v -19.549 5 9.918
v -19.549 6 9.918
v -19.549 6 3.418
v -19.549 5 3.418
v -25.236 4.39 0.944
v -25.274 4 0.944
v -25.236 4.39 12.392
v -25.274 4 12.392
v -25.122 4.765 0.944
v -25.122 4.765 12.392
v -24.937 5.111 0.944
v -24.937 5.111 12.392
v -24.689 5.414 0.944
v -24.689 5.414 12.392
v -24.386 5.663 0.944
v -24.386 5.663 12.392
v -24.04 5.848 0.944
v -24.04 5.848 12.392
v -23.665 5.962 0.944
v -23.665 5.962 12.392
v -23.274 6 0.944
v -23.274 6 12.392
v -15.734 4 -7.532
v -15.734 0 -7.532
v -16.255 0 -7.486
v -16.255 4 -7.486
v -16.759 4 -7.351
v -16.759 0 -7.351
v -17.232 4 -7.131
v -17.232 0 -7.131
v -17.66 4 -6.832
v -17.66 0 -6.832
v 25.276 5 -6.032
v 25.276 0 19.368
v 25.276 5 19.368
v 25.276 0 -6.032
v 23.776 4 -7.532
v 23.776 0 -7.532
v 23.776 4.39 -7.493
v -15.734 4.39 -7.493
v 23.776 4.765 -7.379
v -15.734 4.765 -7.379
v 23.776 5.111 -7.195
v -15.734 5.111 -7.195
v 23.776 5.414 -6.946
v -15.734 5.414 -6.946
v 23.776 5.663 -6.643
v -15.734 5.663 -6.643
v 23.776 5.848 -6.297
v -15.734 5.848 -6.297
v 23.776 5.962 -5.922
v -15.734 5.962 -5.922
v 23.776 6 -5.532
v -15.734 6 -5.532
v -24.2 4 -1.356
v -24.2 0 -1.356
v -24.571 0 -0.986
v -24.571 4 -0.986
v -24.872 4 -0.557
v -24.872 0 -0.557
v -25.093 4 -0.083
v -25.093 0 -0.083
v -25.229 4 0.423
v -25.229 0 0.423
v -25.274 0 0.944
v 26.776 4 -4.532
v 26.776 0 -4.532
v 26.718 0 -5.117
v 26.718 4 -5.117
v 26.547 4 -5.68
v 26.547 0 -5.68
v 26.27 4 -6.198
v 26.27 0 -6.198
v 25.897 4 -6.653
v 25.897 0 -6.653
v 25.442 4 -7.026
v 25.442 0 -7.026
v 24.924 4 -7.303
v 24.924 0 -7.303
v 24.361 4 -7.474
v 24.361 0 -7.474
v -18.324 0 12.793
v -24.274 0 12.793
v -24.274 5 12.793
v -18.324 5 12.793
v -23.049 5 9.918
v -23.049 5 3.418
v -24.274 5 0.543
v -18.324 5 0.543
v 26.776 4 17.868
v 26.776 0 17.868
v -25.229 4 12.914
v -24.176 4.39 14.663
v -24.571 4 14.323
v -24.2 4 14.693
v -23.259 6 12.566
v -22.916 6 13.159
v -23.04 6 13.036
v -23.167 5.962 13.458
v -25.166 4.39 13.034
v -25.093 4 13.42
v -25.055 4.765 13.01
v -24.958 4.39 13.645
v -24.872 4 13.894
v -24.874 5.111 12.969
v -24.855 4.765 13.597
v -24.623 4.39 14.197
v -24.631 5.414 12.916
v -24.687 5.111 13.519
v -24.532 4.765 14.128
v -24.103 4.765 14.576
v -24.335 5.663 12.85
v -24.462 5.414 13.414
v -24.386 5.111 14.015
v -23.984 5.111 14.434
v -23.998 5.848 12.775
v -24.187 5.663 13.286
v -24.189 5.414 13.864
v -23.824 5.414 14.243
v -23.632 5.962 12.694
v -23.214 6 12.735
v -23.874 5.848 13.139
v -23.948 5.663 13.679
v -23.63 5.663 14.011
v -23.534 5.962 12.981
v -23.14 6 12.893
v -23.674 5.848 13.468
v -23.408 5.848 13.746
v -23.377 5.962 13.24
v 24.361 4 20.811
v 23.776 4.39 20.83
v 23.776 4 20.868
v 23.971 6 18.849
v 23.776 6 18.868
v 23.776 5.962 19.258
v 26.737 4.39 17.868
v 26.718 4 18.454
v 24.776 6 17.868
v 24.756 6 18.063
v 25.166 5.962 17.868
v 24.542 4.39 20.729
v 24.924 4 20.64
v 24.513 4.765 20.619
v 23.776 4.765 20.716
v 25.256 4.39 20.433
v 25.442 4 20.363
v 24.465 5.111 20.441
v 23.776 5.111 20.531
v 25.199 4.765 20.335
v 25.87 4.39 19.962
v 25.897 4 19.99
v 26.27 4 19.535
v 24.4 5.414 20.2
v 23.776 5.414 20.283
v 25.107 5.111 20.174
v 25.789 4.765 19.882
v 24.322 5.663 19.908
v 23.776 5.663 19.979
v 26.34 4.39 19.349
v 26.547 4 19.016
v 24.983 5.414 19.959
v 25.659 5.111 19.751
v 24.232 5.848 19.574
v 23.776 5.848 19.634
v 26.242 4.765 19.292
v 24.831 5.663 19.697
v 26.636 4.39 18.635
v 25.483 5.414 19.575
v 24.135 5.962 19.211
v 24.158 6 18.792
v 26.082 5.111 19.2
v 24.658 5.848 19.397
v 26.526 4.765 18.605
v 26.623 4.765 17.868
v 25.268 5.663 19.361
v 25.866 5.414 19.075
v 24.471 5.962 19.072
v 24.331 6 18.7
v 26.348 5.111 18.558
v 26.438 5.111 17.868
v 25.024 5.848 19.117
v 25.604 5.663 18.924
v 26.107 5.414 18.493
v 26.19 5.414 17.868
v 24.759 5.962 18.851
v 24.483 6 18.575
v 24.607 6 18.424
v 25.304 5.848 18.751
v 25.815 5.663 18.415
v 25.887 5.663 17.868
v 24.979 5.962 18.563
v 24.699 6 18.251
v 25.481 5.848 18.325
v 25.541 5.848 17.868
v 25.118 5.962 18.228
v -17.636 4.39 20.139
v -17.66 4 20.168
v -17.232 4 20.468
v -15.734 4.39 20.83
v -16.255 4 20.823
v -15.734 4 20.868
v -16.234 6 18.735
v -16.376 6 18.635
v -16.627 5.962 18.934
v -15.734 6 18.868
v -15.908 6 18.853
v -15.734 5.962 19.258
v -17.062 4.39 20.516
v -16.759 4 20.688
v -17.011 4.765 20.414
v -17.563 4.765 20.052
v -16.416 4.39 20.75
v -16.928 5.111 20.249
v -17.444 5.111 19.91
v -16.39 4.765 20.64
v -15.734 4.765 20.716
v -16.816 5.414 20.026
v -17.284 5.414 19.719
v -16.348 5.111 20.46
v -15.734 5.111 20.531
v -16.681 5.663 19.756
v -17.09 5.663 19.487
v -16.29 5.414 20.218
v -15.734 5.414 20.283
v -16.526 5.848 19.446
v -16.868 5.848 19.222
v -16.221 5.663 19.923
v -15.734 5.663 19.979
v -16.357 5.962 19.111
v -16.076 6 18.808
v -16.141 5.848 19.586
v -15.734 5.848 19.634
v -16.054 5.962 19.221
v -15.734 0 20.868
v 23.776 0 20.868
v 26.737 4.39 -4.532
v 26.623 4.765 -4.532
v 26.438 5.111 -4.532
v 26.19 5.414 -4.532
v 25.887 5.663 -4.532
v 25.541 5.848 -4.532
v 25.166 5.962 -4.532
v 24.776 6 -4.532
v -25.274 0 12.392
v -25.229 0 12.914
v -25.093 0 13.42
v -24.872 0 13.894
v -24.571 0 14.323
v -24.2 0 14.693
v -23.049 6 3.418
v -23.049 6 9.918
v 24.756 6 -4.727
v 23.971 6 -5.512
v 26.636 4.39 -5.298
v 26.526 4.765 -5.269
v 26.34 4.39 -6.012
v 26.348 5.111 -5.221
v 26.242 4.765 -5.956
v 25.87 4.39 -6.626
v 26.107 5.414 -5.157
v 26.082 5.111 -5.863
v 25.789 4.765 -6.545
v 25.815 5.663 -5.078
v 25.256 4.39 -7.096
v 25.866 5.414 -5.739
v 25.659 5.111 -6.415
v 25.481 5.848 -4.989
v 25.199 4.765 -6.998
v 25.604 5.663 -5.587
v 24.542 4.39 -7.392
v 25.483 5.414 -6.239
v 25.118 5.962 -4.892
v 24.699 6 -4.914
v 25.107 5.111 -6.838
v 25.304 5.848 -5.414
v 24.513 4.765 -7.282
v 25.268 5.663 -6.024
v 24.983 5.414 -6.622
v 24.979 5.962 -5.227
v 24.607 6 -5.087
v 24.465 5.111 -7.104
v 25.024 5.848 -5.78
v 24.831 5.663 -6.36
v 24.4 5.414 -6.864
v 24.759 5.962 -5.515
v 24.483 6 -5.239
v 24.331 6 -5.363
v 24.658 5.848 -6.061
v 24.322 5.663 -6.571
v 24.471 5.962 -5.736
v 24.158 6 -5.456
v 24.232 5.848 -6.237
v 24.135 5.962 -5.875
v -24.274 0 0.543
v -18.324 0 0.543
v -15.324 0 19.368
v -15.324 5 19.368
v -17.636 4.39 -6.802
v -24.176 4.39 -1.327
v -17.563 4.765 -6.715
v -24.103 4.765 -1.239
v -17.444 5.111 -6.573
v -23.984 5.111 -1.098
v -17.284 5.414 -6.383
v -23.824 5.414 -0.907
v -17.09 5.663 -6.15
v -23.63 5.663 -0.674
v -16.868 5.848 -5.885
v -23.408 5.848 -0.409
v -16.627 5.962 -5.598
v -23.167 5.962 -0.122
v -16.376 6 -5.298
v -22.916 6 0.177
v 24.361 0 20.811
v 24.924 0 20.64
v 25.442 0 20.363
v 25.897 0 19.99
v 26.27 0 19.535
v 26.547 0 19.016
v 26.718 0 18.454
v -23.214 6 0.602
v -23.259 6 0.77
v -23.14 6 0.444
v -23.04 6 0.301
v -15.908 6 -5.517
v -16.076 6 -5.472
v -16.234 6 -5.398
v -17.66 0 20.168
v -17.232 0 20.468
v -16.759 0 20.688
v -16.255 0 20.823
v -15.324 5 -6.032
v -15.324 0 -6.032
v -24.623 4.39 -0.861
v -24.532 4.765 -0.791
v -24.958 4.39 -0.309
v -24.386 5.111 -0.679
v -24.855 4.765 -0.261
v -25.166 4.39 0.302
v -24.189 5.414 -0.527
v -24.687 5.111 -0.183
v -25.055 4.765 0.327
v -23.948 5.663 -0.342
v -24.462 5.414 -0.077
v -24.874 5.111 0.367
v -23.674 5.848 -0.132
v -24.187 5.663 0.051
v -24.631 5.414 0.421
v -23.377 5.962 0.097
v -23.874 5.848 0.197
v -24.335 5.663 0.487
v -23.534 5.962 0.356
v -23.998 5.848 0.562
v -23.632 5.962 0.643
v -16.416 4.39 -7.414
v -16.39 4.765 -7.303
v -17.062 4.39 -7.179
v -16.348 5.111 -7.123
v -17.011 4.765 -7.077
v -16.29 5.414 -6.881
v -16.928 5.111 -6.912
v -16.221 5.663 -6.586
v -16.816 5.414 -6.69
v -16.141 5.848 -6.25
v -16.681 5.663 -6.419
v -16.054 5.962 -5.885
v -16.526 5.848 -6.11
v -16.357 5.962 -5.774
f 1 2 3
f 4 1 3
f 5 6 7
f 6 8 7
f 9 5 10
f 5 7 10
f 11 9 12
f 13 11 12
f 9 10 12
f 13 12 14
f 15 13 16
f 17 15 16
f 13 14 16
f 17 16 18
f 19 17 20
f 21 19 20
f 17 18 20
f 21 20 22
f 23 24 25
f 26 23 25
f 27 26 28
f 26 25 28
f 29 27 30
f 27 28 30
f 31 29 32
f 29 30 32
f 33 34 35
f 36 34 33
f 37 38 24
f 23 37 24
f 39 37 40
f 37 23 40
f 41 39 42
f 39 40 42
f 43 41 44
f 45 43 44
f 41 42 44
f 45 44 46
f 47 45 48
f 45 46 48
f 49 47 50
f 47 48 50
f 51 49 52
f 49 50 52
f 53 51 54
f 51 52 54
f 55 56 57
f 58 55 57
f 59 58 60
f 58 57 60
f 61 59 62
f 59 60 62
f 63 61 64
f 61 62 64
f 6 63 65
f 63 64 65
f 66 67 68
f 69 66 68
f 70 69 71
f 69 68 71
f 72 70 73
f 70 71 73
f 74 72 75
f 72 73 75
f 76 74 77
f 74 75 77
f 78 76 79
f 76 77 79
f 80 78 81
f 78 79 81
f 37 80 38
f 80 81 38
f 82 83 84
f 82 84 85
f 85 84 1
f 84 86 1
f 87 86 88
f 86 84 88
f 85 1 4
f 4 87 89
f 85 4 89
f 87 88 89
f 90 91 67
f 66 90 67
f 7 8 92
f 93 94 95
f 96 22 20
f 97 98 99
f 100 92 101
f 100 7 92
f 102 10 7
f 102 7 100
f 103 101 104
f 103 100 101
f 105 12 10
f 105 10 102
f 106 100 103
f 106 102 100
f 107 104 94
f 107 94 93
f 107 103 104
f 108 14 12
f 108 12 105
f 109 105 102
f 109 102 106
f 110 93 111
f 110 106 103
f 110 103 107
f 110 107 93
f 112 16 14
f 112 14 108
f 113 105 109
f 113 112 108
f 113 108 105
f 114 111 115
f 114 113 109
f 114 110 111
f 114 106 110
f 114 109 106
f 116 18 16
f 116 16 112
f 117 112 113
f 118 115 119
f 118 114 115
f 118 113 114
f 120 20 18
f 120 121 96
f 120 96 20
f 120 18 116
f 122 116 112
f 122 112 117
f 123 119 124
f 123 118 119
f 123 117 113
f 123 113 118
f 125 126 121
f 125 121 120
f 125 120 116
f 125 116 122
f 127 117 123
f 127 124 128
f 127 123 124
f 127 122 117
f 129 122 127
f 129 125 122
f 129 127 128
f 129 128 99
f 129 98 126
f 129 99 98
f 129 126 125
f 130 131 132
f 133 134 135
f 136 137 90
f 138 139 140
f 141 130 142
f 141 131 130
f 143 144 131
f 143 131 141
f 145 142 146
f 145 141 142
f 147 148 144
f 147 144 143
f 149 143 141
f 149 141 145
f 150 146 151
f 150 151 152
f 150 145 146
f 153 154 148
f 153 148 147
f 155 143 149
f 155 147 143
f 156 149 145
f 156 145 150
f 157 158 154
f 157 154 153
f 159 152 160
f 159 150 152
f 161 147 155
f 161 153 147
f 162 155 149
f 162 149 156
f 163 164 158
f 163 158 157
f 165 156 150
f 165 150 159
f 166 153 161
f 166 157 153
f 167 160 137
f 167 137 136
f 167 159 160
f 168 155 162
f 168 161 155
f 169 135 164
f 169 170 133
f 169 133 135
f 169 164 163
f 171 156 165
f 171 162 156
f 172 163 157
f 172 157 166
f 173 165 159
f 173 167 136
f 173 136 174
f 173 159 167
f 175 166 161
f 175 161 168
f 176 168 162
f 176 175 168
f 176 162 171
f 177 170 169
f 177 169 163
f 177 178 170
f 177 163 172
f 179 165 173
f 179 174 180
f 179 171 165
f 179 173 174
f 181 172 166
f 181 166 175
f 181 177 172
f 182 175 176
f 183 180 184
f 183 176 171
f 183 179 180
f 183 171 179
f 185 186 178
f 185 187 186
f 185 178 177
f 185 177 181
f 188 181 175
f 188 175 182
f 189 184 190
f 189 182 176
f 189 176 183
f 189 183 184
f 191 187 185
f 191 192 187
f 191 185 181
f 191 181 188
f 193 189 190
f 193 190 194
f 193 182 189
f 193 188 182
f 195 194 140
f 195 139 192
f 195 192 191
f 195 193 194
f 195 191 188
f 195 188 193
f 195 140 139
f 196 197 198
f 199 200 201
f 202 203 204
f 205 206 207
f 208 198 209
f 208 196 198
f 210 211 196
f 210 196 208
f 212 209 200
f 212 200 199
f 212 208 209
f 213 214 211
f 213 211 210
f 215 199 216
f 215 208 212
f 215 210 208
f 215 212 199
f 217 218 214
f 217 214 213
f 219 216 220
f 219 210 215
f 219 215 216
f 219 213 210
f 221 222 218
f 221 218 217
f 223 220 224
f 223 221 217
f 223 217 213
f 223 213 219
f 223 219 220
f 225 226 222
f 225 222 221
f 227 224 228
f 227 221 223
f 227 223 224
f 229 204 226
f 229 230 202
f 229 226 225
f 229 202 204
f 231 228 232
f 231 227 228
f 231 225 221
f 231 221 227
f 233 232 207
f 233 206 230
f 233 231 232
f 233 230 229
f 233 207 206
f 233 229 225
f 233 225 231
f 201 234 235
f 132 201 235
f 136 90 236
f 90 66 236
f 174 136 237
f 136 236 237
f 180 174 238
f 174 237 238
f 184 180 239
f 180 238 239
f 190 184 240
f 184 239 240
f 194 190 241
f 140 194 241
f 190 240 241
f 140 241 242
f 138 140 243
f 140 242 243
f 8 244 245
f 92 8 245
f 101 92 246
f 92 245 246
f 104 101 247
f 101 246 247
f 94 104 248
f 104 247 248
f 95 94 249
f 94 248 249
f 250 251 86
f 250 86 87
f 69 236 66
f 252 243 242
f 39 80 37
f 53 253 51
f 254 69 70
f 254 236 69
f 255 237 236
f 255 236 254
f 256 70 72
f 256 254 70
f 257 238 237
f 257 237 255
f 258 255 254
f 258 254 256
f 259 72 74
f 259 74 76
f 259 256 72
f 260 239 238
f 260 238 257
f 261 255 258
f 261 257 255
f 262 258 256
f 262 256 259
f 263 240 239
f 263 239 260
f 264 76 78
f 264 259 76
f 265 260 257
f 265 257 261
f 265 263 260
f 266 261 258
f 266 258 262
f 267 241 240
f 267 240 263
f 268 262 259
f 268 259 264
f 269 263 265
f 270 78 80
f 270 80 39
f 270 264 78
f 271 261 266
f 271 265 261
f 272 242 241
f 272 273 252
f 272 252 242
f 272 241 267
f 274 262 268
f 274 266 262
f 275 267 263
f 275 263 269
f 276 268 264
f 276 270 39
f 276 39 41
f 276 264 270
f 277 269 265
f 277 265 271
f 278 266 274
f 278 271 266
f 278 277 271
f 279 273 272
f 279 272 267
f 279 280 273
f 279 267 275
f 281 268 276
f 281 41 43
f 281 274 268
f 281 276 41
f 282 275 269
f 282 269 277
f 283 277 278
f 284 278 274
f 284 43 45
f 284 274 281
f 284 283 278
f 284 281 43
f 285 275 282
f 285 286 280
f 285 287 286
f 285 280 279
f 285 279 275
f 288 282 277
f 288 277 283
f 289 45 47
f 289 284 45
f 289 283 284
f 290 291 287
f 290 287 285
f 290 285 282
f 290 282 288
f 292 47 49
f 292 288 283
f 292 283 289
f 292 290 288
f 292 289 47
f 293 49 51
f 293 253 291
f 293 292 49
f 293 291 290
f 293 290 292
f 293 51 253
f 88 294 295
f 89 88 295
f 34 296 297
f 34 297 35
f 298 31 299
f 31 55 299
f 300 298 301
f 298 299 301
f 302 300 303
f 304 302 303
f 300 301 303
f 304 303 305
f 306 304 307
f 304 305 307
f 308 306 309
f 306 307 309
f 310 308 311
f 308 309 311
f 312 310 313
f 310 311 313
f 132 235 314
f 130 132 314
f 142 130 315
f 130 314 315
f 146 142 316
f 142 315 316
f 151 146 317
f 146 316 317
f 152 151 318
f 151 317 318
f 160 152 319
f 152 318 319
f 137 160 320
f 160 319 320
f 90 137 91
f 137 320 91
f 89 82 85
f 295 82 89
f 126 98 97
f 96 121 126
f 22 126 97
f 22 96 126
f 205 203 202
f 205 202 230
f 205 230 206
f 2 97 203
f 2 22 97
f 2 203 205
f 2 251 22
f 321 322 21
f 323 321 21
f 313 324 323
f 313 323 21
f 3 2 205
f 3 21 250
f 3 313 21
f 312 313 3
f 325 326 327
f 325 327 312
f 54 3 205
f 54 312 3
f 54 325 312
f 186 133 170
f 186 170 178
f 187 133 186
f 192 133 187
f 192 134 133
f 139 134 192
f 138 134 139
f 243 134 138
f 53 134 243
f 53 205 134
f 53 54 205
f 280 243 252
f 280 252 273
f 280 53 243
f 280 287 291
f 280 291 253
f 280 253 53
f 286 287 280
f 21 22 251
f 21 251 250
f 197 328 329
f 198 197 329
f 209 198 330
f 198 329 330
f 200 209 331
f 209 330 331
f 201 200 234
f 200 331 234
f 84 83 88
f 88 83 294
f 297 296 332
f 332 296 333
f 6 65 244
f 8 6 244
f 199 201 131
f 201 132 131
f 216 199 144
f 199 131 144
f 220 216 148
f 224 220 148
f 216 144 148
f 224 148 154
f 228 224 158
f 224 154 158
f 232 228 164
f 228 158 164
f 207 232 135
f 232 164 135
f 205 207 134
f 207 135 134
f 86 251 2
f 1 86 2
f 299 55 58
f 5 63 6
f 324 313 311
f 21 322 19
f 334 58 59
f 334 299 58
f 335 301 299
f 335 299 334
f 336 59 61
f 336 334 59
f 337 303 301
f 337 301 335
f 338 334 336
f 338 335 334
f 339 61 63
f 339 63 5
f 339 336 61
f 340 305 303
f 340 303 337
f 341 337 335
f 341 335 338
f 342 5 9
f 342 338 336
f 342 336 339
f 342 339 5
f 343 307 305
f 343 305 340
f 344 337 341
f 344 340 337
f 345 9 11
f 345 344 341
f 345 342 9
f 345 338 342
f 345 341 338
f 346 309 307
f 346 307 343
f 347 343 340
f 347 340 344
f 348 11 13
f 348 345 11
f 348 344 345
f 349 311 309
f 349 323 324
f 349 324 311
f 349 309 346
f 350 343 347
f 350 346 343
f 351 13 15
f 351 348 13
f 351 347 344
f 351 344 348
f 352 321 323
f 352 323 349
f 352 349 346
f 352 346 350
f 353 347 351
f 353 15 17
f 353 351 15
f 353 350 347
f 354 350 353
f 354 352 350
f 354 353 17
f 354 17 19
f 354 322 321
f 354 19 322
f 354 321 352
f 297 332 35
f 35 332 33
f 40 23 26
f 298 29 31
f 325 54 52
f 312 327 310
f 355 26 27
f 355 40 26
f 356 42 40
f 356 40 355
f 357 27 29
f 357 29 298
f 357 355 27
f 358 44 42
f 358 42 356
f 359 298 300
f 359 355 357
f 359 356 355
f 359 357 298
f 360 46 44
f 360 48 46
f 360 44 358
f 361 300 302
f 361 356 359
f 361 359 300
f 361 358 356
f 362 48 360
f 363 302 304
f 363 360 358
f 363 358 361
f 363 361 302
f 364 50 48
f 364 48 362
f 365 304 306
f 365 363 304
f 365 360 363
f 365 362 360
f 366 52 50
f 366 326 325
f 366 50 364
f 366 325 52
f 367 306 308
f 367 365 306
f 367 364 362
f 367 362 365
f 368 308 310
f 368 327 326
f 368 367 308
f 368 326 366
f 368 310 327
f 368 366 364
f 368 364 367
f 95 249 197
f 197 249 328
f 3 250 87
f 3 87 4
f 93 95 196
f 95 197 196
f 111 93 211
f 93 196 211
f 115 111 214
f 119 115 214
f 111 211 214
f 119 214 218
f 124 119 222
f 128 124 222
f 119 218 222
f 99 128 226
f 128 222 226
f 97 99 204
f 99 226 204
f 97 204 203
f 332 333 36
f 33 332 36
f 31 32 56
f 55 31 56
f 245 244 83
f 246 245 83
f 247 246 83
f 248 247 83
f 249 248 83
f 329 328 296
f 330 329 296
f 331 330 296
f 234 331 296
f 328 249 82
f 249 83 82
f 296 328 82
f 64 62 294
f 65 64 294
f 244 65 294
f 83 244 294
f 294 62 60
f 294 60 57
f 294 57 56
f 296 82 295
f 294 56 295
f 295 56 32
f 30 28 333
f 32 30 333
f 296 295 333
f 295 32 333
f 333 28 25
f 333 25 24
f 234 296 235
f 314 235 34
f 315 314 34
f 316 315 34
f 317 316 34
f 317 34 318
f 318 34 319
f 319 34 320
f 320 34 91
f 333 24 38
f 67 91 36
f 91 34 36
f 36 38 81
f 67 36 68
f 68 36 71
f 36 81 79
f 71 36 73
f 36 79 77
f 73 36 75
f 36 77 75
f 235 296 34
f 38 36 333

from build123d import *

# Parameters (mm, degrees)
BOSS_EXTRUDE1_DEPTH = 6
SKETCH2_W           = 40.6
SKETCH2_H           = 25.4
SKETCH2_W_2         = 5.95
SKETCH2_H_2         = 12.25
CUT_EXTRUDE1_DEPTH  = 5
SKETCH4_W           = 3.5
SKETCH4_H           = 6.5
CUT_EXTRUDE2_DEPTH  = 35.473394043
FILLET1_R           = 2


with BuildPart() as part:
    # Sketch1 → Boss-Extrude1 (new body)
    with BuildSketch(Plane(origin=(0, 0, 0), x_dir=(1, 0, 0), z_dir=(0, 1, 0))):
        with BuildLine():
            Line((26.775527572, -17.868301802), (26.775527572, 4.531698198))
            ThreePointArc((26.775527572, 4.531698198), (25.896847915, 6.653018542), (23.775527572, 7.531698198))
            Line((23.775527572, 7.531698198), (-15.734378779, 7.531698198))
            ThreePointArc((-15.734378779, 7.531698198), (-16.758931033, 7.351324535), (-17.660281792, 6.831893316))
            Line((-17.660281792, 6.831893316), (-24.200375442, 1.356016089))
            ThreePointArc((-24.200375442, 1.356016089), (-24.992717178, 0.325130027), (-25.274472428, -0.944179029))
            Line((-25.274472428, -0.944179029), (-25.274472428, -12.392424575))
            ThreePointArc((-25.274472428, -12.392424575), (-24.992717178, -13.661733631), (-24.200375442, -14.692619693))
            Line((-24.200375442, -14.692619693), (-17.660281792, -20.16849692))
            ThreePointArc((-17.660281792, -20.16849692), (-16.758931033, -20.687928139), (-15.734378779, -20.868301802))
            Line((-15.734378779, -20.868301802), (23.775527572, -20.868301802))
            ThreePointArc((23.775527572, -20.868301802), (25.896847915, -19.989622146), (26.775527572, -17.868301802))
        make_face()
    extrude(amount=BOSS_EXTRUDE1_DEPTH)

    # Sketch2 → Cut-Extrude1 (cut)
    with BuildSketch(Plane(origin=(0, 0, 0), x_dir=(1, 0, 0), z_dir=(0, 1, 0))):
        with Locations((4.975527572, -6.668301802)):
            Rectangle(SKETCH2_W, SKETCH2_H)
        with Locations((-21.299472428, -6.668301802)):
            Rectangle(SKETCH2_W_2, SKETCH2_H_2)
    extrude(amount=CUT_EXTRUDE1_DEPTH, mode=Mode.SUBTRACT)

    # Sketch4 → Cut-Extrude2 (cut, through all)
    with BuildSketch(Plane(origin=(0, 6, 0), x_dir=(1, 0, 0), z_dir=(0, 1, 0))):
        with Locations((-21.299472428, -6.668301802)):
            Rectangle(SKETCH4_W, SKETCH4_H)
    extrude(amount=-CUT_EXTRUDE2_DEPTH, mode=Mode.SUBTRACT)

    # Fillet1
    fillet1_edges = [part.edges().sort_by_distance(p)[0] for p in [
        (25.896847915, 6, -6.653018542),
        (4.020574397, 6, -7.531698198),
        (-16.758931033, 6, -7.351324535),
        (-20.930328617, 6, -4.093954703),
        (-24.992717178, 6, -0.325130027),
        (-25.274472428, 6, 6.668301802),
        (-24.992717178, 6, 13.661733631),
        (-20.930328617, 6, 17.430558307),
        (-16.758931033, 6, 20.687928139),
        (4.020574397, 6, 20.868301802),
        (25.896847915, 6, 19.989622146),
        (26.775527572, 6, 6.668301802),
    ]]
    fillet(fillet1_edges, radius=FILLET1_R)


solid = part.part
